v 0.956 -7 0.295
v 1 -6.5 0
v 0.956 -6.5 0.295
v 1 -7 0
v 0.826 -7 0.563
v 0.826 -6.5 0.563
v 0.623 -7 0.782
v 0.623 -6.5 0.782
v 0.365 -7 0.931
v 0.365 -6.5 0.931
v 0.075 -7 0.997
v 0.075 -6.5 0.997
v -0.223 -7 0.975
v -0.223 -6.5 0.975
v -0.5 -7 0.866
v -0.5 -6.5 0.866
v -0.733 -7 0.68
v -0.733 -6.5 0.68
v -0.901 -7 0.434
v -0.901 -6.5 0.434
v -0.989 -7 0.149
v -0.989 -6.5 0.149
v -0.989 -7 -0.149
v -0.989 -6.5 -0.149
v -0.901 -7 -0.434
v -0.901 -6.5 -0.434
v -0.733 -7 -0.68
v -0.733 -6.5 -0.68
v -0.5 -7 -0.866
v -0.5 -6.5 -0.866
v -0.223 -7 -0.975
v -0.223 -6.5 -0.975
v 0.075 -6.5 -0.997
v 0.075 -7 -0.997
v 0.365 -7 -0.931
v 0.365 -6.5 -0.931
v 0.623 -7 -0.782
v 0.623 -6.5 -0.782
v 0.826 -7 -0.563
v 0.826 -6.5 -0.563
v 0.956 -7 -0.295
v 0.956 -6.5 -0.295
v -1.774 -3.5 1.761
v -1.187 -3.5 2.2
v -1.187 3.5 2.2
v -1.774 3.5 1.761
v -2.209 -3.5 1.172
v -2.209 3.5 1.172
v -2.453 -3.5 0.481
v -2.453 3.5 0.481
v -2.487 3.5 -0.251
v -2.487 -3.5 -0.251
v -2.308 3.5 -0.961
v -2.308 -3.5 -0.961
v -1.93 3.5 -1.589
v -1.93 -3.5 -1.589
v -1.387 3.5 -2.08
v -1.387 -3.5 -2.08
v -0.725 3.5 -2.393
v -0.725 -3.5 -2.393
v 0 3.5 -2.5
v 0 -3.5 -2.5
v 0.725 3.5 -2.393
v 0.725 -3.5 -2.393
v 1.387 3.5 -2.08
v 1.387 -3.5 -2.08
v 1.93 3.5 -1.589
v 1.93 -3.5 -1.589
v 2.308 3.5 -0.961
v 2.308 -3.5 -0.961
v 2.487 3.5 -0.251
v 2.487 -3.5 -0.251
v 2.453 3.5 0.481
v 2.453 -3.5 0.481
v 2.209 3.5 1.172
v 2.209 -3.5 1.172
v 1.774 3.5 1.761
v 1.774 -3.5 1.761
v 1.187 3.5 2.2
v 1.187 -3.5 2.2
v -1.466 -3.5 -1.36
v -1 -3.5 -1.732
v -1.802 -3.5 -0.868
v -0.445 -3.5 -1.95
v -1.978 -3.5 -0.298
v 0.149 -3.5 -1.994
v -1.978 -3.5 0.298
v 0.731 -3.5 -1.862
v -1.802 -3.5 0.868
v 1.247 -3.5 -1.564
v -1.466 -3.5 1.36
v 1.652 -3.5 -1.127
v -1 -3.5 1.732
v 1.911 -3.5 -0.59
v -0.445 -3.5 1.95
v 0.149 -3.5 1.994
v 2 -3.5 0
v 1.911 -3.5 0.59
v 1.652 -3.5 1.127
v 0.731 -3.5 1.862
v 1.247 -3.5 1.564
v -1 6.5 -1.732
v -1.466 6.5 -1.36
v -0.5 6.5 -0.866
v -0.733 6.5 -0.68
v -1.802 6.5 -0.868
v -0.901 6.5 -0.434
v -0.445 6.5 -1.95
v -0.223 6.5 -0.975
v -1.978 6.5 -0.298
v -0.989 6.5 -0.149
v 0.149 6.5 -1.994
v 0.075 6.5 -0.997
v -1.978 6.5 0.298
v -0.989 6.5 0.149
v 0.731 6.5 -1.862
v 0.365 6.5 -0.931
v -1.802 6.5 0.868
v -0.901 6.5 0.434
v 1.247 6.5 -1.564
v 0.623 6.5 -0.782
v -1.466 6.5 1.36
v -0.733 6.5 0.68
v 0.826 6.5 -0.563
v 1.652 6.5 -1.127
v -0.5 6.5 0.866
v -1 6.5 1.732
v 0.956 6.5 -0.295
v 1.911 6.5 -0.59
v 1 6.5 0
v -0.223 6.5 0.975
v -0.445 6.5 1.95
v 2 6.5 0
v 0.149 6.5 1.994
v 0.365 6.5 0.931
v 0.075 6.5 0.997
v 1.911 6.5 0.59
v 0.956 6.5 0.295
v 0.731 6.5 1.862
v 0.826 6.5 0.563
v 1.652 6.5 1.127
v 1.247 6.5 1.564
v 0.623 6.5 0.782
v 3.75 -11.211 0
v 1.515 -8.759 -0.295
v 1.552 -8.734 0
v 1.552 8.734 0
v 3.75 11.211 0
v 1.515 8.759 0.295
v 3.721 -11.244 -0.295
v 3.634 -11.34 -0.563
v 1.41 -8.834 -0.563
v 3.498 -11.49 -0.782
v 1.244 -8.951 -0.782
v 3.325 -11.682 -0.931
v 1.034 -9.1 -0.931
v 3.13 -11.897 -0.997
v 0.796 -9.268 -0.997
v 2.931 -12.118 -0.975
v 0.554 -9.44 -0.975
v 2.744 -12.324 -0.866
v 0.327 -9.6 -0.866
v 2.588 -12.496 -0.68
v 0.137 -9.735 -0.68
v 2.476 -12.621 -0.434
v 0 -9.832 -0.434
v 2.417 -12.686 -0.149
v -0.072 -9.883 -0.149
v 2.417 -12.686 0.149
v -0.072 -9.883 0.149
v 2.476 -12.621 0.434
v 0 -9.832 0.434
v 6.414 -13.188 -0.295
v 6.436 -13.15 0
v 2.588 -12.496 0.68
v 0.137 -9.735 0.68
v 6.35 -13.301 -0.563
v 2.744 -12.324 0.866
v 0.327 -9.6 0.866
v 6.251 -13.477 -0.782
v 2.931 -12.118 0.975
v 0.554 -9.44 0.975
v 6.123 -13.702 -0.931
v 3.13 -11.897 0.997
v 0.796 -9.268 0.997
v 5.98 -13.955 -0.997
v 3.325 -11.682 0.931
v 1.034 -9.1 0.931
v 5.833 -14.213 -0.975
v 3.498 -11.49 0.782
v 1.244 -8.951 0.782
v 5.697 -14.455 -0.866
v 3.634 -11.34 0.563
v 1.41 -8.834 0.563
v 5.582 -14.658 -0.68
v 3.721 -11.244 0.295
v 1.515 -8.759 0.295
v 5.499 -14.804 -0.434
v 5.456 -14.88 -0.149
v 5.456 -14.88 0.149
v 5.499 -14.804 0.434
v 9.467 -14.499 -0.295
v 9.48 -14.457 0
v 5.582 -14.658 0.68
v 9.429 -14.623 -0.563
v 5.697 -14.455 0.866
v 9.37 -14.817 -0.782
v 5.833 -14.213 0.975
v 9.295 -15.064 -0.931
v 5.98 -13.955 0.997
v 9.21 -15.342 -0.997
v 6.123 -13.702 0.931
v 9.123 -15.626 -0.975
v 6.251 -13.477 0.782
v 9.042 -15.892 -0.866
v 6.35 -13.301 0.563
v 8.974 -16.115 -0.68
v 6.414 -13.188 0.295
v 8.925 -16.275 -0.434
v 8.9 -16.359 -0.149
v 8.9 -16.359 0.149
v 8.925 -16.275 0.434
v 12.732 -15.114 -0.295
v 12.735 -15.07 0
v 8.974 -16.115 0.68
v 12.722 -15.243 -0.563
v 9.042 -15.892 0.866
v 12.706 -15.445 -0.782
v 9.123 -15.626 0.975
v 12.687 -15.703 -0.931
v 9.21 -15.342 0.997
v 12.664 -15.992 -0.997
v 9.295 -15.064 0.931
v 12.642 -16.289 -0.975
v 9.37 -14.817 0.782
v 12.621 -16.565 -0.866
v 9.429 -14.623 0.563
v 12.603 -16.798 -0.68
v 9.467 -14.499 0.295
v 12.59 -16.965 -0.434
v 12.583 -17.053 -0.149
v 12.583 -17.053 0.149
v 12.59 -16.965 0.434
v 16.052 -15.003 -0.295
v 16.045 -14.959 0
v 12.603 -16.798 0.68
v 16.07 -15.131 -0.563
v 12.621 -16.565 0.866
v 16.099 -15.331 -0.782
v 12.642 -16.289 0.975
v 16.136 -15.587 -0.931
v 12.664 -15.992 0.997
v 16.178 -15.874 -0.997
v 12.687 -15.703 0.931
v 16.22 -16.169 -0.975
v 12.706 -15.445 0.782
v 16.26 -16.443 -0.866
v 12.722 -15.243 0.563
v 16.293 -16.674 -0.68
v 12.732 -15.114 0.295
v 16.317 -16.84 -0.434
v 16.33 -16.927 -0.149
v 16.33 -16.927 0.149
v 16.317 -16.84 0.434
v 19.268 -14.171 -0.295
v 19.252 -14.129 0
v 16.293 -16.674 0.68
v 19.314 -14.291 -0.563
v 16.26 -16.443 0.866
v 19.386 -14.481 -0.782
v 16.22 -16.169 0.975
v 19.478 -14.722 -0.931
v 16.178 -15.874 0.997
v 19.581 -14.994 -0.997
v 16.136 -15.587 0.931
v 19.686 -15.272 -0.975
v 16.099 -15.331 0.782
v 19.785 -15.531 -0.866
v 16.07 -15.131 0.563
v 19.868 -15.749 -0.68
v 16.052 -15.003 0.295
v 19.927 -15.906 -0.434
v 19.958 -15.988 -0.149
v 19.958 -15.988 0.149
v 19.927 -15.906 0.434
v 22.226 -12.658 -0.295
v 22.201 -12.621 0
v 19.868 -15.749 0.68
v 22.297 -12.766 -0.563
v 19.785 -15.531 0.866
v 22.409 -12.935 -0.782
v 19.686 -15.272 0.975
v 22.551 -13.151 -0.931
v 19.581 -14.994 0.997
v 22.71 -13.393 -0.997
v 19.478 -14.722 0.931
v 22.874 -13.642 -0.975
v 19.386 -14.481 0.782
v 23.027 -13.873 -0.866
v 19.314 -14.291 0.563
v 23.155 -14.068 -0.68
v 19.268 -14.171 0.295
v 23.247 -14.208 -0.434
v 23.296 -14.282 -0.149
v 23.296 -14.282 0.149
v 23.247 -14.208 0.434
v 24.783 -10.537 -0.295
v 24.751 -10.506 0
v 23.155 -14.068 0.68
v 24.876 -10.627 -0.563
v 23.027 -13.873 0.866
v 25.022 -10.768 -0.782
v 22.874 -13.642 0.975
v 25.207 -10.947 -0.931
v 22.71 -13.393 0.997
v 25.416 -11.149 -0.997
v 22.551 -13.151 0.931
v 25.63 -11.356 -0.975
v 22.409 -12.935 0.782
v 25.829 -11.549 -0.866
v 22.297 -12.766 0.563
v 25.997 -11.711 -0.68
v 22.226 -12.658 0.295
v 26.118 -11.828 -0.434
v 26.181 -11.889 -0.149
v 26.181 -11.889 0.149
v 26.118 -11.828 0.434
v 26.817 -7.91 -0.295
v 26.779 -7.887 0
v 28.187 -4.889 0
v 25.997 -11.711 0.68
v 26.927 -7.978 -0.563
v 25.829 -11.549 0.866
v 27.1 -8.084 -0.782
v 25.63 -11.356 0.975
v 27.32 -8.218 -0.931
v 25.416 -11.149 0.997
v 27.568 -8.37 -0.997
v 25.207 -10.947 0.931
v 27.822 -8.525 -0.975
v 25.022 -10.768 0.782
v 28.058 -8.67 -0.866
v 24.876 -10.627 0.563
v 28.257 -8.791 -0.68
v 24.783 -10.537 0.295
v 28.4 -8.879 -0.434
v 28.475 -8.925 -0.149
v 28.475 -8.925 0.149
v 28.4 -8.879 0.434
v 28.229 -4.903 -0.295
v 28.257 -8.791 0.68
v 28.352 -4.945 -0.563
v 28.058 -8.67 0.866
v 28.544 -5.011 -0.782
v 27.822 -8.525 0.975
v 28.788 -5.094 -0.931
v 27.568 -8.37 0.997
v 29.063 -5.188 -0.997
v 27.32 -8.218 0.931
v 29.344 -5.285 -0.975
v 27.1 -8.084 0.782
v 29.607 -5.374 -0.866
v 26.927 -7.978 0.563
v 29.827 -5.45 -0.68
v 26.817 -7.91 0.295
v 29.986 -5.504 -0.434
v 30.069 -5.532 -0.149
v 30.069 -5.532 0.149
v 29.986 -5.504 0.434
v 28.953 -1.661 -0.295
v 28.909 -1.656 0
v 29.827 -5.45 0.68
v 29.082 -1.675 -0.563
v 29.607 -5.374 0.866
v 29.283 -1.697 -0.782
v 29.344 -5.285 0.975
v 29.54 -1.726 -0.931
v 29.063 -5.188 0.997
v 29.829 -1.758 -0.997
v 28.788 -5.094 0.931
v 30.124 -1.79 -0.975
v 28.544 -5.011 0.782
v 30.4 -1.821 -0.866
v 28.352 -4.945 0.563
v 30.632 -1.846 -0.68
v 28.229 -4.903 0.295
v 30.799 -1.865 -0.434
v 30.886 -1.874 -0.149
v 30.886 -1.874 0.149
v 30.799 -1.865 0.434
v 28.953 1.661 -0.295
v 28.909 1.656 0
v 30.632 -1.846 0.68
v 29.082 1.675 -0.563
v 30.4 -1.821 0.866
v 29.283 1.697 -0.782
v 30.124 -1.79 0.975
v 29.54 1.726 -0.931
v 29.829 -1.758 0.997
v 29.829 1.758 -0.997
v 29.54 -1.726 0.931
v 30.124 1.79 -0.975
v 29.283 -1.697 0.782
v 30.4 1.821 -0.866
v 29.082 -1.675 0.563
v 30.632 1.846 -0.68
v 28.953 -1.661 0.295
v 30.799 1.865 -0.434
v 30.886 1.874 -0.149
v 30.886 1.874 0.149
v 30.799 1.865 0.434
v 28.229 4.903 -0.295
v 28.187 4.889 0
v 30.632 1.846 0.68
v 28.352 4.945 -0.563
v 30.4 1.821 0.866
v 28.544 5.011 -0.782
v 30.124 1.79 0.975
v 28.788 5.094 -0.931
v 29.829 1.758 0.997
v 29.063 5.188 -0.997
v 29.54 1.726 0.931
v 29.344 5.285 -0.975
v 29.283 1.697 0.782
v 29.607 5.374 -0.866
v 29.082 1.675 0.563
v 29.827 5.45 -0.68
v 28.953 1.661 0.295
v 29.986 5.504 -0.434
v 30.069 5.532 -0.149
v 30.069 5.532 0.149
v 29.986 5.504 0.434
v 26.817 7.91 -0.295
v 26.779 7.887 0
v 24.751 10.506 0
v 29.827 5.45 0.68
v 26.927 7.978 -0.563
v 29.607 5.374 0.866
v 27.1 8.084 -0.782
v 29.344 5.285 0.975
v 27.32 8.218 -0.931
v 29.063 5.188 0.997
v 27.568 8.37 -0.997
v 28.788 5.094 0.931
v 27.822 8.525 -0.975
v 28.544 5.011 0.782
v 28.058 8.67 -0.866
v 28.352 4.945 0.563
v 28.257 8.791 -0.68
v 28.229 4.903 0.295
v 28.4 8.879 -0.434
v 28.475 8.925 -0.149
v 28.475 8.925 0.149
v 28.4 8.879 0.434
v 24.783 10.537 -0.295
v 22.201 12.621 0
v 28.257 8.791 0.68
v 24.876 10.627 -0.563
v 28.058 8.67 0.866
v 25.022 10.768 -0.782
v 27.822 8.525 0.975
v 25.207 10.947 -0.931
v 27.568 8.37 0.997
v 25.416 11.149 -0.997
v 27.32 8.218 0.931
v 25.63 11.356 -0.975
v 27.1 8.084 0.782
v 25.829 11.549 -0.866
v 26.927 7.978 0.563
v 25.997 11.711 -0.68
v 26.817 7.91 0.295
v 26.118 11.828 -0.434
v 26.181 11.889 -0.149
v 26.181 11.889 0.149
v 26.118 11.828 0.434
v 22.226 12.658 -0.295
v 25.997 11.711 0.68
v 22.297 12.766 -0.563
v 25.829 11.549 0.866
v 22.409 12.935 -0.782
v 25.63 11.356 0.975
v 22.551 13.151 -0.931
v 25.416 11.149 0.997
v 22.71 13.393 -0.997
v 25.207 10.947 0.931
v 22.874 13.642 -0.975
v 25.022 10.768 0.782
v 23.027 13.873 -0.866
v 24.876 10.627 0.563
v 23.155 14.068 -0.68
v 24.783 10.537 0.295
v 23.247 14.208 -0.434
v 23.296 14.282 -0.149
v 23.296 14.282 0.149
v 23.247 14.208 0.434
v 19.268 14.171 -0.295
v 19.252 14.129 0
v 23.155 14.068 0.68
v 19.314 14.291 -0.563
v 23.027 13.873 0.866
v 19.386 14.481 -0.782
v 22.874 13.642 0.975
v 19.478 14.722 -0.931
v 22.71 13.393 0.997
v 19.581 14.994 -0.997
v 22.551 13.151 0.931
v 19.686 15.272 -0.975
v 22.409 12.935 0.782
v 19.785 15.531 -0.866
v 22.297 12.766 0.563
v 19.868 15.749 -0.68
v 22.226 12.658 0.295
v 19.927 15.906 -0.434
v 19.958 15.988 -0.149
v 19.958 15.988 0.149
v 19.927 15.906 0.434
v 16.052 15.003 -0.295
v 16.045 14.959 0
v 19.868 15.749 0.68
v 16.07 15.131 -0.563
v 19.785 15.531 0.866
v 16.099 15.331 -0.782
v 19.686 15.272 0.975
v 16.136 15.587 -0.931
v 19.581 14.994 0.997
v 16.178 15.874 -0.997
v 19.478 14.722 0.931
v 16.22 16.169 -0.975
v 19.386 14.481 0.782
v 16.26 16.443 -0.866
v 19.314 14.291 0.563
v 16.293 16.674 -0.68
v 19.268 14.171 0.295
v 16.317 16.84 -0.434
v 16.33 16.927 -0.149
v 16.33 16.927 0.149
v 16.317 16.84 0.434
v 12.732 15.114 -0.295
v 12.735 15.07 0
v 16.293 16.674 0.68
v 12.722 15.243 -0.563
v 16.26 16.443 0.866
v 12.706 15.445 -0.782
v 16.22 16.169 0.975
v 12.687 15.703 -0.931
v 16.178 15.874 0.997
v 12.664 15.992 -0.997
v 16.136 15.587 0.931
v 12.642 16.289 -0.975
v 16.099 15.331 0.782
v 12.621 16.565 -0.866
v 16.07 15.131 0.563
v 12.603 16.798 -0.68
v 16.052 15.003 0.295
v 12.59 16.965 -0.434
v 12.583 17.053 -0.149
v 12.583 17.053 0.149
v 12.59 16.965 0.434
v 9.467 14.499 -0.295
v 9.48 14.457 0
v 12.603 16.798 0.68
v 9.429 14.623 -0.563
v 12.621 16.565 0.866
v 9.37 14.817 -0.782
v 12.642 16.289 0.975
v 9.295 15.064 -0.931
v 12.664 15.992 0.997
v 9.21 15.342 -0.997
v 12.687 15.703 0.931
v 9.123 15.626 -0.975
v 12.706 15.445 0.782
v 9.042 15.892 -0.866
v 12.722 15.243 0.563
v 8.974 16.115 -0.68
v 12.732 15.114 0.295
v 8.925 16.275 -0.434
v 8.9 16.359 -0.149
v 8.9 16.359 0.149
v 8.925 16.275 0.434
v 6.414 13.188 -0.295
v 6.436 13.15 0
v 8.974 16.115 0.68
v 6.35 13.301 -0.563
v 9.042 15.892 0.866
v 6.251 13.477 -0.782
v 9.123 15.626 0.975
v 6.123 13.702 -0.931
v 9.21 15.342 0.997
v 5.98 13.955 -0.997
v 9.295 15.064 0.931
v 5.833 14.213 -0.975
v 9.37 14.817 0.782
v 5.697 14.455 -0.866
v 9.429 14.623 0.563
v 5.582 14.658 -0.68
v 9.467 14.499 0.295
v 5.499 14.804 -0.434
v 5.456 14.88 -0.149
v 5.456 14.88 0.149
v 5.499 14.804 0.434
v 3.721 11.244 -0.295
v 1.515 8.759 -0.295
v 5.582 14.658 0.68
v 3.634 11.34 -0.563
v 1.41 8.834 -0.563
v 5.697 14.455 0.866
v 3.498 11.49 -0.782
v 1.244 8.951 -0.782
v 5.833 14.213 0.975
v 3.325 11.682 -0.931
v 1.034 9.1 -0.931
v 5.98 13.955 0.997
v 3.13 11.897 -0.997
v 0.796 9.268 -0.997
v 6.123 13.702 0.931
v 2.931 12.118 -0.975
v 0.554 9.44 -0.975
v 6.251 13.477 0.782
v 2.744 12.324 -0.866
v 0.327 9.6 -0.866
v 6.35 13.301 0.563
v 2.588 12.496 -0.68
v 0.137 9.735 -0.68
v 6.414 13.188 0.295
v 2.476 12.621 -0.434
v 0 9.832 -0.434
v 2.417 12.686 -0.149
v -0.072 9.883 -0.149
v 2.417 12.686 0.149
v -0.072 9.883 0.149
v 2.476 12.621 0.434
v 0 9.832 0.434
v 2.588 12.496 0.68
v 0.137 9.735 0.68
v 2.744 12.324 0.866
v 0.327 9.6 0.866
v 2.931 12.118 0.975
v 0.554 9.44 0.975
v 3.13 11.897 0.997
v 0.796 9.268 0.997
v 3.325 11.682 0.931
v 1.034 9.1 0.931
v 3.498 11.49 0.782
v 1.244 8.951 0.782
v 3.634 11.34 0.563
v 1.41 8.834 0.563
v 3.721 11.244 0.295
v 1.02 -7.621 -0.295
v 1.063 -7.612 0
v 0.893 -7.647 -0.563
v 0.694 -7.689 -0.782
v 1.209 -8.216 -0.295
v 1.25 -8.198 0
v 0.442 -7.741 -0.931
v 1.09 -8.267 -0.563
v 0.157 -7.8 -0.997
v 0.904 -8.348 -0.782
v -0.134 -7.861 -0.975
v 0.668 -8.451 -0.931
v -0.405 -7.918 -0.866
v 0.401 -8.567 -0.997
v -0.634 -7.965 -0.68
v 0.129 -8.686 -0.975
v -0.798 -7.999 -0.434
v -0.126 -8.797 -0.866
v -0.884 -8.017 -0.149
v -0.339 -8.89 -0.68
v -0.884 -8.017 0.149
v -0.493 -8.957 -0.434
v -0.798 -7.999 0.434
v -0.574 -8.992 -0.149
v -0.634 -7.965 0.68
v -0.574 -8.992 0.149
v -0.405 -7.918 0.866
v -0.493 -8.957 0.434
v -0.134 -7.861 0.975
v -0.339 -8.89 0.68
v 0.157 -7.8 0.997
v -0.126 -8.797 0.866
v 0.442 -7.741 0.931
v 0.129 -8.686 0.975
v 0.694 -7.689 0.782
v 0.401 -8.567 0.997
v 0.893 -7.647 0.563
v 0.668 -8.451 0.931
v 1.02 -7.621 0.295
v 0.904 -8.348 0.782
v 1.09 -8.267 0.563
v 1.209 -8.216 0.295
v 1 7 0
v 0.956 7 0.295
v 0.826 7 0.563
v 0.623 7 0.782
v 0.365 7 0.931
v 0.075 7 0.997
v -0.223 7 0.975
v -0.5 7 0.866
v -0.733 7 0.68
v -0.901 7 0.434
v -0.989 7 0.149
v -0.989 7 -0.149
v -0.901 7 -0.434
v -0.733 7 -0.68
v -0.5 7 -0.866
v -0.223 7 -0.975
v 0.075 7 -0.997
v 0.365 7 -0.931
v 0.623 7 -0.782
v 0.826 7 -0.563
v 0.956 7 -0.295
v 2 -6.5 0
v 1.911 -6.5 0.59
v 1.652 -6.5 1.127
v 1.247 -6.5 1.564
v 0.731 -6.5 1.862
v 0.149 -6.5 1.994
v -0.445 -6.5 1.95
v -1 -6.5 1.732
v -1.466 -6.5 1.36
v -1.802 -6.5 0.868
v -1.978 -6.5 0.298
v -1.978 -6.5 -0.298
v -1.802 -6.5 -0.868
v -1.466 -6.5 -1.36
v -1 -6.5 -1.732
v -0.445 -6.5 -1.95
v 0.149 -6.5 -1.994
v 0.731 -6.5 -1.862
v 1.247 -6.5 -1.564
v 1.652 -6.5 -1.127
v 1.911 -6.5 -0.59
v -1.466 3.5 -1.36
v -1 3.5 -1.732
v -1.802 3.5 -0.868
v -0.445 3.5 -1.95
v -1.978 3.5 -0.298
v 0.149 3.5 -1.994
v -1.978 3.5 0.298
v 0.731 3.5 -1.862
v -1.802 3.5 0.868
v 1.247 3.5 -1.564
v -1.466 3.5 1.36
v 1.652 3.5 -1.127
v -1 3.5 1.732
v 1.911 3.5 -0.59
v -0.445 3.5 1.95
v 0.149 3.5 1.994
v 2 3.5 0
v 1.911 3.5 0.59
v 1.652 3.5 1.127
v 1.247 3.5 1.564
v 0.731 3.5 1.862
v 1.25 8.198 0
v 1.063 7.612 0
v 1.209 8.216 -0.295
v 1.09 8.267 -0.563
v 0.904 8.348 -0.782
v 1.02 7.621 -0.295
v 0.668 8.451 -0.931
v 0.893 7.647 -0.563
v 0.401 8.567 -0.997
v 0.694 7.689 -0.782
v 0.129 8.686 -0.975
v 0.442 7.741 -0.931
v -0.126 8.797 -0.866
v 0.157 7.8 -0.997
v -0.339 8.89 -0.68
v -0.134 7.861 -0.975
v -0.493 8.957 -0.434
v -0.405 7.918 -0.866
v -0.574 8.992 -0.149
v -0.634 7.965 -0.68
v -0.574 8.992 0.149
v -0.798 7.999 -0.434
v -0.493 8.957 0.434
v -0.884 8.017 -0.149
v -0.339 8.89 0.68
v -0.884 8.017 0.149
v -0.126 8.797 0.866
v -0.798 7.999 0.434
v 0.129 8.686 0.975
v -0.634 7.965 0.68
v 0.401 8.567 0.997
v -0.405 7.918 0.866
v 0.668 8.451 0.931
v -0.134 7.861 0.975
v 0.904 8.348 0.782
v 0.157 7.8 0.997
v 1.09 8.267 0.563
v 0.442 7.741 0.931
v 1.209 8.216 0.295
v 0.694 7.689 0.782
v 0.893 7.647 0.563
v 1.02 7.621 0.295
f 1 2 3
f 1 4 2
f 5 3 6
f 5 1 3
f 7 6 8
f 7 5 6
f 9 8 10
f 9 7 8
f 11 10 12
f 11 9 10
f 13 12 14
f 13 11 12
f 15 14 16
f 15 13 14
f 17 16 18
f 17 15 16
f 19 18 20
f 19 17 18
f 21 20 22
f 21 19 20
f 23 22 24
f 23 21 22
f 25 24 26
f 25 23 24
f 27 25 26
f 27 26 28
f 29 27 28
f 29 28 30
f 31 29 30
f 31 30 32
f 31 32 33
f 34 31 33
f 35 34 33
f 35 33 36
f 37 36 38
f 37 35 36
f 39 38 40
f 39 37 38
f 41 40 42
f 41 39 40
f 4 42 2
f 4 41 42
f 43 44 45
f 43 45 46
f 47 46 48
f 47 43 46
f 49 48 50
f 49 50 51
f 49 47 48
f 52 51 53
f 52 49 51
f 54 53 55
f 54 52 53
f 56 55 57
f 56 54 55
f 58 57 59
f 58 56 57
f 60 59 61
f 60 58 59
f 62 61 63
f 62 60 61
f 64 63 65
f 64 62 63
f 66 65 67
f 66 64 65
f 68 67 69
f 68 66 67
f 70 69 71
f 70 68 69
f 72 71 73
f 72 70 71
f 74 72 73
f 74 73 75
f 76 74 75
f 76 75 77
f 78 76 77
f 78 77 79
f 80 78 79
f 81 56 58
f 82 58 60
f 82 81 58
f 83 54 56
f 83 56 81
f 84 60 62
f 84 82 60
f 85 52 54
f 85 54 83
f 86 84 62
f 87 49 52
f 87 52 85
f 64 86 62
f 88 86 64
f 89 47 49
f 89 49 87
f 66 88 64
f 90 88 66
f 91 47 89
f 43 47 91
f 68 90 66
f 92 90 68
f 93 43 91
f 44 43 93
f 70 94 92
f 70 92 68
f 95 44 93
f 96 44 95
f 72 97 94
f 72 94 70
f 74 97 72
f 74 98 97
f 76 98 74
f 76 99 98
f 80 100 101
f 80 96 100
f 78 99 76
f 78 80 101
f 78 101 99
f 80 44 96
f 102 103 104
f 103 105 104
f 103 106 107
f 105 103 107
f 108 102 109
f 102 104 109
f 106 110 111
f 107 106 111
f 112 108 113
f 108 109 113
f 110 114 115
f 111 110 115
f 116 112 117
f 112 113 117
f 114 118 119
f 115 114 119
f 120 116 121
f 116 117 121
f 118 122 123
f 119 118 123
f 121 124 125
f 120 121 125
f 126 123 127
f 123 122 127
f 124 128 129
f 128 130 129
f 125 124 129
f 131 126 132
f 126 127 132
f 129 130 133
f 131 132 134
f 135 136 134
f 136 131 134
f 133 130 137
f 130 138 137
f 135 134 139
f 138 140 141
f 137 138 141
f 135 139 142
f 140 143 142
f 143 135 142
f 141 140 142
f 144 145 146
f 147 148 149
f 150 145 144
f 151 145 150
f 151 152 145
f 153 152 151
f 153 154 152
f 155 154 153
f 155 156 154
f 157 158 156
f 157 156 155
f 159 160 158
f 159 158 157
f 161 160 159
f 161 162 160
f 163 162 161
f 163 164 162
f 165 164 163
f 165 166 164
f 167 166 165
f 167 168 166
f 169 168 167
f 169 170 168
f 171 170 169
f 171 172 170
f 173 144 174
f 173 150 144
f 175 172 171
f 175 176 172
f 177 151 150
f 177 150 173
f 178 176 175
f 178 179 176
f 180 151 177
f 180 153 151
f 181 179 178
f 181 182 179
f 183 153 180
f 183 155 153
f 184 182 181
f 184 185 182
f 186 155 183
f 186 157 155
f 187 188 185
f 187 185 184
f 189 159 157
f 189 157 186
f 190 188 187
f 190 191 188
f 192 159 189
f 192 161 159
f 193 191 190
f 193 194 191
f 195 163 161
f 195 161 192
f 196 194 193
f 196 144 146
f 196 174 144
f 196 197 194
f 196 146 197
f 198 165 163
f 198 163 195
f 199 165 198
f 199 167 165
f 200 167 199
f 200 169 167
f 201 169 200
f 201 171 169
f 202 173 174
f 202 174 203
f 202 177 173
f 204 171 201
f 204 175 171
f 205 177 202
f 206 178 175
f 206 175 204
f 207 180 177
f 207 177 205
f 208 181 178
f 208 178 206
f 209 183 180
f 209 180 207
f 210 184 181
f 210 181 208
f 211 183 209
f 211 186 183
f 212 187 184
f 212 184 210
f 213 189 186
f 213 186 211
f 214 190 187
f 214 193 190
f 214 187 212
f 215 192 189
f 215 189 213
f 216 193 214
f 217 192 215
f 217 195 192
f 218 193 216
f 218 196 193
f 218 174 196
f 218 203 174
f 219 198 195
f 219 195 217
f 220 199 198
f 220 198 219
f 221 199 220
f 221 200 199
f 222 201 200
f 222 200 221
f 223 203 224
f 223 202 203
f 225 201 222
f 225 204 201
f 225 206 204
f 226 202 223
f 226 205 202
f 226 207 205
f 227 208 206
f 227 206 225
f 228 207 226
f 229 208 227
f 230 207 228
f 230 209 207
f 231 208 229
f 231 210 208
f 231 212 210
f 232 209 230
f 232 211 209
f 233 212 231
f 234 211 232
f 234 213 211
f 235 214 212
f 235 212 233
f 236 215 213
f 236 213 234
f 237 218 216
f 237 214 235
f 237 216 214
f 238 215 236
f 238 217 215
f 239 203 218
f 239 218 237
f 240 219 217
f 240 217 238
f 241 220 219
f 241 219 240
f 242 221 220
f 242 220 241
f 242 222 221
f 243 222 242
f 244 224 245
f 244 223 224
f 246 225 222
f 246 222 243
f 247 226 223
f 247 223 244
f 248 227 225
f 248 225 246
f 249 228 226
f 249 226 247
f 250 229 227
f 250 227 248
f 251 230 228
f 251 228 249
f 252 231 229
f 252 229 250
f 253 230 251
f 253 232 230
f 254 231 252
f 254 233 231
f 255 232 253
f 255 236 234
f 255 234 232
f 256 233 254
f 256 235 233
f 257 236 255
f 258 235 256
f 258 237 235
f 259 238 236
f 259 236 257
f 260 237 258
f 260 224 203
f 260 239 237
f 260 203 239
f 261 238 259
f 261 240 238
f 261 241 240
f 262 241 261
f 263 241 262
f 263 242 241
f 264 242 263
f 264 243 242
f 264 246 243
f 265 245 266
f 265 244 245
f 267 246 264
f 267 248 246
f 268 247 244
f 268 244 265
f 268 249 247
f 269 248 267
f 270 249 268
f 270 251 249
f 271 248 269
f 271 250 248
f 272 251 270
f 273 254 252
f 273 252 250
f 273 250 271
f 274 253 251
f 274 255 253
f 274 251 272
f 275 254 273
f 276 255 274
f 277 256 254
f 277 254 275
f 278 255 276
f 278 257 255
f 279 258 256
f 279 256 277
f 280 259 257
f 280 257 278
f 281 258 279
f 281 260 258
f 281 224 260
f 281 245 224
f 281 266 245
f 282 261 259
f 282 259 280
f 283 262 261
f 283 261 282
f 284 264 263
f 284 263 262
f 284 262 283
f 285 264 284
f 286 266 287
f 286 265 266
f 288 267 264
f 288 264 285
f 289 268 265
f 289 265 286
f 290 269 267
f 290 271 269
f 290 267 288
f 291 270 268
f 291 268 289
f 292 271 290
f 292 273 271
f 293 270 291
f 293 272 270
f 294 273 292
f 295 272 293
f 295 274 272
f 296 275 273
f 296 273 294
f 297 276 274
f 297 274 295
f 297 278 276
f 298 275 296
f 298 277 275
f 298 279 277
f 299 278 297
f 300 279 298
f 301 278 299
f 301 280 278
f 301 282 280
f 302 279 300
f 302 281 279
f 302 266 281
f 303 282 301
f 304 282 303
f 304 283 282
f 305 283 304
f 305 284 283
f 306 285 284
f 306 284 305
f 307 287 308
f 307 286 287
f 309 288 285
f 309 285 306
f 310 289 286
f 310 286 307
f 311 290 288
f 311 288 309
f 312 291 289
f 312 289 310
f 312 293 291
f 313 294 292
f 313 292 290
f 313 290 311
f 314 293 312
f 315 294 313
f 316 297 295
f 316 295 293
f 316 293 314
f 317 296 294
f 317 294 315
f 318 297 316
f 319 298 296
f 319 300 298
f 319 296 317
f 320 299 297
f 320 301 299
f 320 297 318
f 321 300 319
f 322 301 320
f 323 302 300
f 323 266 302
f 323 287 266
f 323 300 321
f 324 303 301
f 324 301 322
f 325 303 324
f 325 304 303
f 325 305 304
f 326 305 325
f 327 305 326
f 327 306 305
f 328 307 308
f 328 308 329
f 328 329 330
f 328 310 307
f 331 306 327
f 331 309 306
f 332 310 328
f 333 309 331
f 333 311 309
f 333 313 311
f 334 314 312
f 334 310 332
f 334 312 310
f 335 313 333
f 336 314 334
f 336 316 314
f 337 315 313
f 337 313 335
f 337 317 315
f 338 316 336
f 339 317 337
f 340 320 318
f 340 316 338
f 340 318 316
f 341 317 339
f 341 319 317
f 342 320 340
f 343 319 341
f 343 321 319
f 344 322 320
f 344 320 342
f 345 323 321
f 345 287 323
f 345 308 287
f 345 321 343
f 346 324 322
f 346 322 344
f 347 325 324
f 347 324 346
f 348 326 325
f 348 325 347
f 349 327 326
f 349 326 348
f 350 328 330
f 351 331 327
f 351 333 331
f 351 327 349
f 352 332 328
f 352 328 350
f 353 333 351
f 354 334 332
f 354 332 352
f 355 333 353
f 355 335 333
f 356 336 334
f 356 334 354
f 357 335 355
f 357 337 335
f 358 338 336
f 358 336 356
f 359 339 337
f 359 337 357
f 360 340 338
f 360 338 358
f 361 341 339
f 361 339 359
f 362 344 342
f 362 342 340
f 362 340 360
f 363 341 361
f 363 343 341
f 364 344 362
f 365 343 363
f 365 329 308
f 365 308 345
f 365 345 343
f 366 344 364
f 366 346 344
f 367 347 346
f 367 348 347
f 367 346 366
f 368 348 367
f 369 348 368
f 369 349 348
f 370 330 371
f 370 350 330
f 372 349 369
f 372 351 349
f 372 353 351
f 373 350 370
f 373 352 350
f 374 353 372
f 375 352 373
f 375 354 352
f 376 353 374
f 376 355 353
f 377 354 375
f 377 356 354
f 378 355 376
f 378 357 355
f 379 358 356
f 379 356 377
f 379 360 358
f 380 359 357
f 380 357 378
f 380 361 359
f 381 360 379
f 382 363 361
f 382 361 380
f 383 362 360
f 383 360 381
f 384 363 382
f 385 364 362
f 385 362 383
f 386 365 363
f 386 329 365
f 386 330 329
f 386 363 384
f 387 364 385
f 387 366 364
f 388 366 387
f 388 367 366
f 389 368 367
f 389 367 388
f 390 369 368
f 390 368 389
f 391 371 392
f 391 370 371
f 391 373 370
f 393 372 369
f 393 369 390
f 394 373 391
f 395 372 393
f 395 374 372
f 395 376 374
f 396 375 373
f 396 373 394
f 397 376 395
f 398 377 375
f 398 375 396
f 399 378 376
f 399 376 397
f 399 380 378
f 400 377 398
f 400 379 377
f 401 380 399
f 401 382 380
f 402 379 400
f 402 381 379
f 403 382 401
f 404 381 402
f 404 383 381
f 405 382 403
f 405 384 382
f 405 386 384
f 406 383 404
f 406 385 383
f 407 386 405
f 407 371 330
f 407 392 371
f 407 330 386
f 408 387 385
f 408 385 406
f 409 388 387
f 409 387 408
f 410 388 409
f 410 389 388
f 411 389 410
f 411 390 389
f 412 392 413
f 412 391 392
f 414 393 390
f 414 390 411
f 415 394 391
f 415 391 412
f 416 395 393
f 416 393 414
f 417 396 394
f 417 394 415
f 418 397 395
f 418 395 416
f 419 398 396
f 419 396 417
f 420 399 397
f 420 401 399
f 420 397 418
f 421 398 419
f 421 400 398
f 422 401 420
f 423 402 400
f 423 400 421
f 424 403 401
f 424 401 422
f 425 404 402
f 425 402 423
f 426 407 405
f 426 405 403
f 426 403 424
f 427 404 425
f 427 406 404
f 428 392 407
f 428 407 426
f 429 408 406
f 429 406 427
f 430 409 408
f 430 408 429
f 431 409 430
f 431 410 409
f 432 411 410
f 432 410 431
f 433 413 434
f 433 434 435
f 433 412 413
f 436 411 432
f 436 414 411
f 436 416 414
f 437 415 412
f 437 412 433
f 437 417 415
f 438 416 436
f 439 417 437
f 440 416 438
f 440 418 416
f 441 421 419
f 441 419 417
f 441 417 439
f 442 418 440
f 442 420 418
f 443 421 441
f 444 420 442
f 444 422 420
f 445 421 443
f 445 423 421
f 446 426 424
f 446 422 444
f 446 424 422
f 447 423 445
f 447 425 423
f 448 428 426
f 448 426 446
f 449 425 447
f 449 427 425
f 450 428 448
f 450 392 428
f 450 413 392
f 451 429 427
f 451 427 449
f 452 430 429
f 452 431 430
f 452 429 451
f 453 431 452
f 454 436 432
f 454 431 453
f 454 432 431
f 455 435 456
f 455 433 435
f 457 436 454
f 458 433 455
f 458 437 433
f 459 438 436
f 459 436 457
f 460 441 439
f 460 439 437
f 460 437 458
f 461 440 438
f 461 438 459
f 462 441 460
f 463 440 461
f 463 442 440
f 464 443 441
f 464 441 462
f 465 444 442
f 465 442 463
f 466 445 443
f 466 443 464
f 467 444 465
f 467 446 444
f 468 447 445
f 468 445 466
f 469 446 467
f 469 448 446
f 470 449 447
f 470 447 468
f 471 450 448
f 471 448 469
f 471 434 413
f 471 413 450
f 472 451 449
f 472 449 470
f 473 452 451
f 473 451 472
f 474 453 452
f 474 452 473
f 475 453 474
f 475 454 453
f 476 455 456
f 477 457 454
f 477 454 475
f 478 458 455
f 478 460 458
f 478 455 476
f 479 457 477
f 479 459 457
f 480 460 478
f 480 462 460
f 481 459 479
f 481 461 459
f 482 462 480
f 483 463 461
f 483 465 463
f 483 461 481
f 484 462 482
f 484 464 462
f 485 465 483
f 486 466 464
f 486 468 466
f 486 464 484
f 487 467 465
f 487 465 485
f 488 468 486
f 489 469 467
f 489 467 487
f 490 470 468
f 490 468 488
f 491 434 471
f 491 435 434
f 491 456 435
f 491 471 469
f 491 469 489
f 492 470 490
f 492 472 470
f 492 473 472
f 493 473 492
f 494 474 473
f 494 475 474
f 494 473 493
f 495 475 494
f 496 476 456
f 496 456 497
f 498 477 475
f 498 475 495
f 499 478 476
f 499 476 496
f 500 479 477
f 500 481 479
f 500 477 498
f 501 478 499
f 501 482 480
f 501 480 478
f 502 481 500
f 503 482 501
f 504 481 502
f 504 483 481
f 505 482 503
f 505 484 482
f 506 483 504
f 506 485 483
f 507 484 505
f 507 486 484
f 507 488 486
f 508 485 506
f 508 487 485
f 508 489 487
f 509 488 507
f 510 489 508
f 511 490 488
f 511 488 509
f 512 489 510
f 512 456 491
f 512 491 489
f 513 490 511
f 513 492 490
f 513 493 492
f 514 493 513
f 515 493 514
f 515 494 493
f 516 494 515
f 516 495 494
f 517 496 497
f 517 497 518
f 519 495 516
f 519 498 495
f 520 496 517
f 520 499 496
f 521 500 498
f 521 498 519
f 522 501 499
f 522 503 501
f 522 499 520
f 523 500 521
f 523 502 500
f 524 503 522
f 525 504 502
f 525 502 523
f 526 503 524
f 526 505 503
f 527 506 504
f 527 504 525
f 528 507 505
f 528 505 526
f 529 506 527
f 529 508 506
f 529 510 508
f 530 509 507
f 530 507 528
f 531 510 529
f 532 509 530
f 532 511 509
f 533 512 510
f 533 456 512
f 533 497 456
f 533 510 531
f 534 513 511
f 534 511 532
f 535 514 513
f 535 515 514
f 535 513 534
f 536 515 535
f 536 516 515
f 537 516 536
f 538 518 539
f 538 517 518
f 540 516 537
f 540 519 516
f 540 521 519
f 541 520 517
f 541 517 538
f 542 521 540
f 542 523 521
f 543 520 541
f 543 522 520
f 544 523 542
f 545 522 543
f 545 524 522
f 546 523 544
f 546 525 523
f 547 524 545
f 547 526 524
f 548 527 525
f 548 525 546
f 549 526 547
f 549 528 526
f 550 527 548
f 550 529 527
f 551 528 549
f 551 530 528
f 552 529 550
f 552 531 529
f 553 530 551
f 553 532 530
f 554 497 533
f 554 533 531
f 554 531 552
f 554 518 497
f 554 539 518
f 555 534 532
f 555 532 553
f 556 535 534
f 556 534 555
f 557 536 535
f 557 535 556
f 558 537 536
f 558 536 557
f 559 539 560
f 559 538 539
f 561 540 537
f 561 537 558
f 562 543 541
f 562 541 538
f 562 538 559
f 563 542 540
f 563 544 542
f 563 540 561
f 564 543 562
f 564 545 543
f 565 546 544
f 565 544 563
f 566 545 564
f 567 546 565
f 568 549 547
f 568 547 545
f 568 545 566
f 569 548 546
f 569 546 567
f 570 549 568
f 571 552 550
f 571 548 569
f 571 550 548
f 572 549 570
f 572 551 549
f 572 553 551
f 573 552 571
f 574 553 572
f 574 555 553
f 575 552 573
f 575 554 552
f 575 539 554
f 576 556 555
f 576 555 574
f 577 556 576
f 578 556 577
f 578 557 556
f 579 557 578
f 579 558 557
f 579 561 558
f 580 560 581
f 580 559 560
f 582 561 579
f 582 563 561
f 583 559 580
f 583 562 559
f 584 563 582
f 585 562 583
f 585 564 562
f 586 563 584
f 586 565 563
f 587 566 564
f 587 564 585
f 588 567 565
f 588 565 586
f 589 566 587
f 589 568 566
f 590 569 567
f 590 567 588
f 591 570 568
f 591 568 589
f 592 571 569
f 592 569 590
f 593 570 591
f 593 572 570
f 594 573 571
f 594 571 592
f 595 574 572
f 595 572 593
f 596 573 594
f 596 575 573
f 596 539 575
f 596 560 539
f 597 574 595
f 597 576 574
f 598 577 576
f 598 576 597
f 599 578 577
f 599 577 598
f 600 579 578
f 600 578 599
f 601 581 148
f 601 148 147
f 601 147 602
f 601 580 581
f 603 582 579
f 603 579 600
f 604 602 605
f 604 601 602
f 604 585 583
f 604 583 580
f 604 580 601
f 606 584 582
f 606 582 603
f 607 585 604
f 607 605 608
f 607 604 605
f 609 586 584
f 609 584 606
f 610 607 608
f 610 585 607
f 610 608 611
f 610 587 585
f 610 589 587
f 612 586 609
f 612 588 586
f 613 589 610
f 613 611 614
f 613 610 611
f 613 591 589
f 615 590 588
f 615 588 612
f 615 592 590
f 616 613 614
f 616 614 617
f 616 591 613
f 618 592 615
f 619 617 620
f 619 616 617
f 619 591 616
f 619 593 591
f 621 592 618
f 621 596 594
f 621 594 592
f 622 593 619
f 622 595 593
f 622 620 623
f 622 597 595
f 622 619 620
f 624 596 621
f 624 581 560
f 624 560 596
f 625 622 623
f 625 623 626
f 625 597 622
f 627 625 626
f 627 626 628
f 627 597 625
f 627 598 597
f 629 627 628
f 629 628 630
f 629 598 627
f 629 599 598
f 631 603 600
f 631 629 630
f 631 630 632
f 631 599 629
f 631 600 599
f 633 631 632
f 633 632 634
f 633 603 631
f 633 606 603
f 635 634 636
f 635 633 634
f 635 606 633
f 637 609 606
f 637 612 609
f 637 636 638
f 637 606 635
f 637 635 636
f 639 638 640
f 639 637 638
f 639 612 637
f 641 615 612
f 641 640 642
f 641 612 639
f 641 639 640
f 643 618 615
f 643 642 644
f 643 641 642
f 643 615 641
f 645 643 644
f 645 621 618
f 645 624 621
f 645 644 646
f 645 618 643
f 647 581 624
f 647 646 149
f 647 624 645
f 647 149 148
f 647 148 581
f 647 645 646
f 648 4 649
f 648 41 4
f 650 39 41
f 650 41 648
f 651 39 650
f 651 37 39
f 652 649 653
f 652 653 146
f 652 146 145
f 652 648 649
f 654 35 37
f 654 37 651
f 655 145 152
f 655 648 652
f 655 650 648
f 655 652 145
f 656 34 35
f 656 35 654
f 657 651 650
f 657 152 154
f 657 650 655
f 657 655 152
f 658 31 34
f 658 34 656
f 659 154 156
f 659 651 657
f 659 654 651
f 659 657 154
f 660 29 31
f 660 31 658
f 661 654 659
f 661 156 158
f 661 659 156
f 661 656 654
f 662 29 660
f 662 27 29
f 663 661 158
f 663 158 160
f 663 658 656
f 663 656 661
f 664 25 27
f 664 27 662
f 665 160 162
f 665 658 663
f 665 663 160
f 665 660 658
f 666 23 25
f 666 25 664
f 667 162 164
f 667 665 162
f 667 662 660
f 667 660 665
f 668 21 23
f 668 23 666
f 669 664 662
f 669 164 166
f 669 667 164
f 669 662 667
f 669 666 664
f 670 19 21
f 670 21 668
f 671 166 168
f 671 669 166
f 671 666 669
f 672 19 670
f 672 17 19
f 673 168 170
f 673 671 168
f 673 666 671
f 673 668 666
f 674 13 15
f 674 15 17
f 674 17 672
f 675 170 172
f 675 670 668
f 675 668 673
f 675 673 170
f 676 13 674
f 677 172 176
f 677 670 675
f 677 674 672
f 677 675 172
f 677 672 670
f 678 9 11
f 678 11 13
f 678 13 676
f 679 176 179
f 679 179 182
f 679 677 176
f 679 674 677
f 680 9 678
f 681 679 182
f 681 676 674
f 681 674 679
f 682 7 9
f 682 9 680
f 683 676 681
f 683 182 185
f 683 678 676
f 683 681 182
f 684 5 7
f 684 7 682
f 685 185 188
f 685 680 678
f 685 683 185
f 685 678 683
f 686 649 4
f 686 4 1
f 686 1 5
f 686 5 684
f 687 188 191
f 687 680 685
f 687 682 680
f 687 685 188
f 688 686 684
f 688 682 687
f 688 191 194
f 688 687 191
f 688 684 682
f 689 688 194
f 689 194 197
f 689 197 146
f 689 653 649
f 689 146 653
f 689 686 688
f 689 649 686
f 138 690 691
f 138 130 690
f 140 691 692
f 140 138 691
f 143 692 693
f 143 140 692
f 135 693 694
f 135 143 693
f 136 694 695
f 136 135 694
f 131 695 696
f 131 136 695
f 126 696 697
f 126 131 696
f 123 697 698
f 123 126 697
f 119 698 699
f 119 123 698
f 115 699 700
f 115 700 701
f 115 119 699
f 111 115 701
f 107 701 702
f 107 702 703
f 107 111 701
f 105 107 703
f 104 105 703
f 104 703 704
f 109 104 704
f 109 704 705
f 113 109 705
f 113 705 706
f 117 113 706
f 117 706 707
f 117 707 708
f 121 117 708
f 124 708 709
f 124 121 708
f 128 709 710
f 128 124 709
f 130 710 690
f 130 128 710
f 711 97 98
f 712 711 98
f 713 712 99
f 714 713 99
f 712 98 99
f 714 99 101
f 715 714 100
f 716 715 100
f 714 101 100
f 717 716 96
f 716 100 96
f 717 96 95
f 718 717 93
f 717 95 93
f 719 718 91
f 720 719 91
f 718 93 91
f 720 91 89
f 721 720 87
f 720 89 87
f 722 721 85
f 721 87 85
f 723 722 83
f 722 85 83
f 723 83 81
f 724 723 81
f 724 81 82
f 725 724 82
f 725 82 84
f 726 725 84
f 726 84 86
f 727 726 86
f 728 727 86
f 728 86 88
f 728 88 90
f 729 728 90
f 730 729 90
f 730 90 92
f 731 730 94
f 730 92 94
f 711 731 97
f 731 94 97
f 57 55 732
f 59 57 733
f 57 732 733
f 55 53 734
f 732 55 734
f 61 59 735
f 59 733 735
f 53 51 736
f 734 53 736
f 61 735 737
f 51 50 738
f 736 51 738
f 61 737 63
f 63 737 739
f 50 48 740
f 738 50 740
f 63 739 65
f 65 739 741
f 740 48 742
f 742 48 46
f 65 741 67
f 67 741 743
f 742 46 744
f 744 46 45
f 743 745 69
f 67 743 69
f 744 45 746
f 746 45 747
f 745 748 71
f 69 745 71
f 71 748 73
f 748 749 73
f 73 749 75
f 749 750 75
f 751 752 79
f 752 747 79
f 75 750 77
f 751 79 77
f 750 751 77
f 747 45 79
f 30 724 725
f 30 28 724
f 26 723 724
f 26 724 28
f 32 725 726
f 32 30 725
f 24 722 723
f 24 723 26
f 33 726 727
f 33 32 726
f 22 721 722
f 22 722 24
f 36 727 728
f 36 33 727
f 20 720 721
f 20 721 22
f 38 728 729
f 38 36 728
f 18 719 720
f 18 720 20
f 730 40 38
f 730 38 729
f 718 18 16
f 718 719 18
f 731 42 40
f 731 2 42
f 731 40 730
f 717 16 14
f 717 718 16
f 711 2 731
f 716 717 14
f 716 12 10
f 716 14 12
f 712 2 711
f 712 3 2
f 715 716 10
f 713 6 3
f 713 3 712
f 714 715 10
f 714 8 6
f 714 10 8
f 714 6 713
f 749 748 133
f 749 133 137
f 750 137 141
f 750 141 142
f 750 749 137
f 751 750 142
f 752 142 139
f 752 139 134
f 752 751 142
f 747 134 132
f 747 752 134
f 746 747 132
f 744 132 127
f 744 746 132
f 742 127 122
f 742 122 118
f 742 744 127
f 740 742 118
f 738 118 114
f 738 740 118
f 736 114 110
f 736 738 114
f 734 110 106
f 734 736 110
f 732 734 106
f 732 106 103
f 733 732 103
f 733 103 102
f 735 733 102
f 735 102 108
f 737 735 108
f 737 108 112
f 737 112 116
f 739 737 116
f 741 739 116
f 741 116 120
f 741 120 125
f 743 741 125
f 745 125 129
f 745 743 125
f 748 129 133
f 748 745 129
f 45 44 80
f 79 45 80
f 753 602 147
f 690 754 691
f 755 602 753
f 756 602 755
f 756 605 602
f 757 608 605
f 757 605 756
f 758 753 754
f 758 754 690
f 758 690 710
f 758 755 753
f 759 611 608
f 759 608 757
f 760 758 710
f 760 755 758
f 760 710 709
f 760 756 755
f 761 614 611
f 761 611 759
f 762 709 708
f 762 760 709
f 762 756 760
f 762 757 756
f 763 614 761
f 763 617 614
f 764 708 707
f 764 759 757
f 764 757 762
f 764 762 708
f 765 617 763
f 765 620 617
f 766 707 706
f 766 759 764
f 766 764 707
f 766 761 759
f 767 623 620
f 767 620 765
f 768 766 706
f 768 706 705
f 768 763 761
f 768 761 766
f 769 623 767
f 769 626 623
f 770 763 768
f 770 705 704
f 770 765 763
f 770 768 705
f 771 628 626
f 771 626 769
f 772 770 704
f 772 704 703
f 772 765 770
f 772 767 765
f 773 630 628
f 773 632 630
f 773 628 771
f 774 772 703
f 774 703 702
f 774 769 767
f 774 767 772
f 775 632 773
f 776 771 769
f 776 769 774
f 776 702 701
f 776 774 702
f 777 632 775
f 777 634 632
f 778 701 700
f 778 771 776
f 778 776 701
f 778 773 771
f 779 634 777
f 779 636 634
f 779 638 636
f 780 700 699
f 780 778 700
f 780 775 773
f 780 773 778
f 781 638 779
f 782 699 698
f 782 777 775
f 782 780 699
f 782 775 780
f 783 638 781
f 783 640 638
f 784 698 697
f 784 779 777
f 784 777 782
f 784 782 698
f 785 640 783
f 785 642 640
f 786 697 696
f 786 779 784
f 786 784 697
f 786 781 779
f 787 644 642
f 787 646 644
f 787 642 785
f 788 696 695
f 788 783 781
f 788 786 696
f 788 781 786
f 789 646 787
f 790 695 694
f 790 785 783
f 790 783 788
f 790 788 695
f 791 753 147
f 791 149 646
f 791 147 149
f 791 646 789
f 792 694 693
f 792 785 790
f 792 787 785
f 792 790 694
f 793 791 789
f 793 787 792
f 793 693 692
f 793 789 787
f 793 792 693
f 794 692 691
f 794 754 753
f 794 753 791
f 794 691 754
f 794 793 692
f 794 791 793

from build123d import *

# Parameters (mm, degrees)
F0_R     = 2.5
F1_DEPTH = 3.5
F2_W     = 2.3748684174
F2_H     = 0.3
F3_DEPTH = 7.001
F4_R     = 2
F5_DEPTH = 3
F7_R     = 1


# Not quite as in the source:
# - a pattern or mirror of a feature is missing from the dataset's text; its kind, count and spacing are read off the source's solid


with BuildPart() as f1:
    # F0 (on Front) → F1 (new body, symmetric)
    with BuildSketch(Plane.XZ):
        Circle(F0_R)
    extrude(amount=F1_DEPTH, both=True)

    # F2 (on face) → F3 (cut, through all)
    with BuildSketch(Plane.XZ.offset(3.5)):
        with Locations((0, 2.35)):
            Rectangle(F2_W, F2_H)
    extrude(amount=-F3_DEPTH, mode=Mode.SUBTRACT)

    # F4 (on face) → F5 (join)
    with BuildSketch(Plane.XZ.offset(3.5)):
        Circle(F4_R)
    f5 = extrude(amount=F5_DEPTH)

    # F5_copies: F5 across plane
    add(f5.mirror(Plane.ZX))

    # F8: sweep along a path in F6
    with BuildLine(Plane.XY) as f8_path:
        Line((0, 7), (0, -7))
        ThreePointArc((0, -7), (0.1882968799, -8.2128146291), (0.7354596623, -9.3114446529))
        ThreePointArc((0.7354596623, -9.3114446529), (30, 0), (0.7354596623, 9.3114446529))
        ThreePointArc((0.7354596623, 9.3114446529), (0.1882968799, 8.2128146291), (0, 7))
    # F7 (on face) → F8 (sweep)
    with BuildSketch(Plane.XZ.offset(6.5)):
        Circle(F7_R)
    sweep(path=f8_path.line)


solid = f1.part
